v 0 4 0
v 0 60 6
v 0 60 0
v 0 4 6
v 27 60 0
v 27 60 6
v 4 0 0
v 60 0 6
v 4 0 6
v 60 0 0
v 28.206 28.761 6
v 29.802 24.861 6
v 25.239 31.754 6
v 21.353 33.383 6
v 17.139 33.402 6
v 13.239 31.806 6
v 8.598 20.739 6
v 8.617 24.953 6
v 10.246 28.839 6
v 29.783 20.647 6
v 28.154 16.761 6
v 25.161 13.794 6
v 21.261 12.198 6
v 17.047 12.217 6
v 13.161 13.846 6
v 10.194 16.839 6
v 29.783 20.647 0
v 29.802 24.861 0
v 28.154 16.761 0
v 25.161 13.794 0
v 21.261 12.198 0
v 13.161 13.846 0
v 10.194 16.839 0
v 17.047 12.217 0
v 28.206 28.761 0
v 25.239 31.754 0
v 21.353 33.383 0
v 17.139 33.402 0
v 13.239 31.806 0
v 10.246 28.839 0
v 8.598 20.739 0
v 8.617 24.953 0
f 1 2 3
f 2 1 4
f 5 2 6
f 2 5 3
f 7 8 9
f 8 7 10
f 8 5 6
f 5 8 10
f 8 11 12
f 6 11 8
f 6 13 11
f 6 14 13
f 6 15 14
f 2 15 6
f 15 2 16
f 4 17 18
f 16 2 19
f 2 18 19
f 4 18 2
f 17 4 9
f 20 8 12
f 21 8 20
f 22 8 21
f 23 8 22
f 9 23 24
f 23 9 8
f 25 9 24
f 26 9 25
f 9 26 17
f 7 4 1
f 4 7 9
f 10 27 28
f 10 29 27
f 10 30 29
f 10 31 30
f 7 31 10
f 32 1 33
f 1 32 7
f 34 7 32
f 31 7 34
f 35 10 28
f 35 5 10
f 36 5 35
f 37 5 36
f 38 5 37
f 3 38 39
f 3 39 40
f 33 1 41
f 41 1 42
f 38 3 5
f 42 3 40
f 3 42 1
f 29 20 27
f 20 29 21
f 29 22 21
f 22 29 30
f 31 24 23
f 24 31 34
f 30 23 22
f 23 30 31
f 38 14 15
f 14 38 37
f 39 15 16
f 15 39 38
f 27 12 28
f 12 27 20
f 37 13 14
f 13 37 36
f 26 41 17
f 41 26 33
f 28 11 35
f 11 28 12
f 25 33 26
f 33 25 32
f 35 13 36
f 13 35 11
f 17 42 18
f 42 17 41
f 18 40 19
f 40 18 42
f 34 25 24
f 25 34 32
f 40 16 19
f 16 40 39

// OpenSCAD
$fn = 32;

// ----------------------------------------------------------------------
// Bracket plate: gusset 60 x 60
// ----------------------------------------------------------------------

// --- parameters (mm) ---
hole_r = 4;               // bolt hole radius
plate_t = 6;              // plate thickness, Z (extrusion height)
gus_a = 60;               // base length
gus_b = 60;               // height
top_x = 27;               // top edge X of the angled cut
light_r = 10.8;           // lightening hole radius

light_d = 2 * light_r;

profile = [[4, 0], [30, 0], [60, 0], [27, 60], [0, 60], [0, 4]];  // primary outline, 6 points, counter clockwise
void_1 = [[29.802, 24.861], [28.206, 28.761], [25.239, 31.754], [21.353, 33.383], [17.139, 33.402], [13.239, 31.806], [10.246, 28.839], [8.617, 24.953], [8.598, 20.739], [10.194, 16.839], [13.161, 13.846], [17.047, 12.217], [21.261, 12.198], [25.161, 13.794], [28.154, 16.761], [29.783, 20.647]];  // lightening hole, 16 points

// --- the one profile operation ---
difference() {
  linear_extrude(height = plate_t) polygon(points = profile);
  translate([0, 0, -1])
    linear_extrude(height = plate_t + 2) polygon(points = void_1);
}
